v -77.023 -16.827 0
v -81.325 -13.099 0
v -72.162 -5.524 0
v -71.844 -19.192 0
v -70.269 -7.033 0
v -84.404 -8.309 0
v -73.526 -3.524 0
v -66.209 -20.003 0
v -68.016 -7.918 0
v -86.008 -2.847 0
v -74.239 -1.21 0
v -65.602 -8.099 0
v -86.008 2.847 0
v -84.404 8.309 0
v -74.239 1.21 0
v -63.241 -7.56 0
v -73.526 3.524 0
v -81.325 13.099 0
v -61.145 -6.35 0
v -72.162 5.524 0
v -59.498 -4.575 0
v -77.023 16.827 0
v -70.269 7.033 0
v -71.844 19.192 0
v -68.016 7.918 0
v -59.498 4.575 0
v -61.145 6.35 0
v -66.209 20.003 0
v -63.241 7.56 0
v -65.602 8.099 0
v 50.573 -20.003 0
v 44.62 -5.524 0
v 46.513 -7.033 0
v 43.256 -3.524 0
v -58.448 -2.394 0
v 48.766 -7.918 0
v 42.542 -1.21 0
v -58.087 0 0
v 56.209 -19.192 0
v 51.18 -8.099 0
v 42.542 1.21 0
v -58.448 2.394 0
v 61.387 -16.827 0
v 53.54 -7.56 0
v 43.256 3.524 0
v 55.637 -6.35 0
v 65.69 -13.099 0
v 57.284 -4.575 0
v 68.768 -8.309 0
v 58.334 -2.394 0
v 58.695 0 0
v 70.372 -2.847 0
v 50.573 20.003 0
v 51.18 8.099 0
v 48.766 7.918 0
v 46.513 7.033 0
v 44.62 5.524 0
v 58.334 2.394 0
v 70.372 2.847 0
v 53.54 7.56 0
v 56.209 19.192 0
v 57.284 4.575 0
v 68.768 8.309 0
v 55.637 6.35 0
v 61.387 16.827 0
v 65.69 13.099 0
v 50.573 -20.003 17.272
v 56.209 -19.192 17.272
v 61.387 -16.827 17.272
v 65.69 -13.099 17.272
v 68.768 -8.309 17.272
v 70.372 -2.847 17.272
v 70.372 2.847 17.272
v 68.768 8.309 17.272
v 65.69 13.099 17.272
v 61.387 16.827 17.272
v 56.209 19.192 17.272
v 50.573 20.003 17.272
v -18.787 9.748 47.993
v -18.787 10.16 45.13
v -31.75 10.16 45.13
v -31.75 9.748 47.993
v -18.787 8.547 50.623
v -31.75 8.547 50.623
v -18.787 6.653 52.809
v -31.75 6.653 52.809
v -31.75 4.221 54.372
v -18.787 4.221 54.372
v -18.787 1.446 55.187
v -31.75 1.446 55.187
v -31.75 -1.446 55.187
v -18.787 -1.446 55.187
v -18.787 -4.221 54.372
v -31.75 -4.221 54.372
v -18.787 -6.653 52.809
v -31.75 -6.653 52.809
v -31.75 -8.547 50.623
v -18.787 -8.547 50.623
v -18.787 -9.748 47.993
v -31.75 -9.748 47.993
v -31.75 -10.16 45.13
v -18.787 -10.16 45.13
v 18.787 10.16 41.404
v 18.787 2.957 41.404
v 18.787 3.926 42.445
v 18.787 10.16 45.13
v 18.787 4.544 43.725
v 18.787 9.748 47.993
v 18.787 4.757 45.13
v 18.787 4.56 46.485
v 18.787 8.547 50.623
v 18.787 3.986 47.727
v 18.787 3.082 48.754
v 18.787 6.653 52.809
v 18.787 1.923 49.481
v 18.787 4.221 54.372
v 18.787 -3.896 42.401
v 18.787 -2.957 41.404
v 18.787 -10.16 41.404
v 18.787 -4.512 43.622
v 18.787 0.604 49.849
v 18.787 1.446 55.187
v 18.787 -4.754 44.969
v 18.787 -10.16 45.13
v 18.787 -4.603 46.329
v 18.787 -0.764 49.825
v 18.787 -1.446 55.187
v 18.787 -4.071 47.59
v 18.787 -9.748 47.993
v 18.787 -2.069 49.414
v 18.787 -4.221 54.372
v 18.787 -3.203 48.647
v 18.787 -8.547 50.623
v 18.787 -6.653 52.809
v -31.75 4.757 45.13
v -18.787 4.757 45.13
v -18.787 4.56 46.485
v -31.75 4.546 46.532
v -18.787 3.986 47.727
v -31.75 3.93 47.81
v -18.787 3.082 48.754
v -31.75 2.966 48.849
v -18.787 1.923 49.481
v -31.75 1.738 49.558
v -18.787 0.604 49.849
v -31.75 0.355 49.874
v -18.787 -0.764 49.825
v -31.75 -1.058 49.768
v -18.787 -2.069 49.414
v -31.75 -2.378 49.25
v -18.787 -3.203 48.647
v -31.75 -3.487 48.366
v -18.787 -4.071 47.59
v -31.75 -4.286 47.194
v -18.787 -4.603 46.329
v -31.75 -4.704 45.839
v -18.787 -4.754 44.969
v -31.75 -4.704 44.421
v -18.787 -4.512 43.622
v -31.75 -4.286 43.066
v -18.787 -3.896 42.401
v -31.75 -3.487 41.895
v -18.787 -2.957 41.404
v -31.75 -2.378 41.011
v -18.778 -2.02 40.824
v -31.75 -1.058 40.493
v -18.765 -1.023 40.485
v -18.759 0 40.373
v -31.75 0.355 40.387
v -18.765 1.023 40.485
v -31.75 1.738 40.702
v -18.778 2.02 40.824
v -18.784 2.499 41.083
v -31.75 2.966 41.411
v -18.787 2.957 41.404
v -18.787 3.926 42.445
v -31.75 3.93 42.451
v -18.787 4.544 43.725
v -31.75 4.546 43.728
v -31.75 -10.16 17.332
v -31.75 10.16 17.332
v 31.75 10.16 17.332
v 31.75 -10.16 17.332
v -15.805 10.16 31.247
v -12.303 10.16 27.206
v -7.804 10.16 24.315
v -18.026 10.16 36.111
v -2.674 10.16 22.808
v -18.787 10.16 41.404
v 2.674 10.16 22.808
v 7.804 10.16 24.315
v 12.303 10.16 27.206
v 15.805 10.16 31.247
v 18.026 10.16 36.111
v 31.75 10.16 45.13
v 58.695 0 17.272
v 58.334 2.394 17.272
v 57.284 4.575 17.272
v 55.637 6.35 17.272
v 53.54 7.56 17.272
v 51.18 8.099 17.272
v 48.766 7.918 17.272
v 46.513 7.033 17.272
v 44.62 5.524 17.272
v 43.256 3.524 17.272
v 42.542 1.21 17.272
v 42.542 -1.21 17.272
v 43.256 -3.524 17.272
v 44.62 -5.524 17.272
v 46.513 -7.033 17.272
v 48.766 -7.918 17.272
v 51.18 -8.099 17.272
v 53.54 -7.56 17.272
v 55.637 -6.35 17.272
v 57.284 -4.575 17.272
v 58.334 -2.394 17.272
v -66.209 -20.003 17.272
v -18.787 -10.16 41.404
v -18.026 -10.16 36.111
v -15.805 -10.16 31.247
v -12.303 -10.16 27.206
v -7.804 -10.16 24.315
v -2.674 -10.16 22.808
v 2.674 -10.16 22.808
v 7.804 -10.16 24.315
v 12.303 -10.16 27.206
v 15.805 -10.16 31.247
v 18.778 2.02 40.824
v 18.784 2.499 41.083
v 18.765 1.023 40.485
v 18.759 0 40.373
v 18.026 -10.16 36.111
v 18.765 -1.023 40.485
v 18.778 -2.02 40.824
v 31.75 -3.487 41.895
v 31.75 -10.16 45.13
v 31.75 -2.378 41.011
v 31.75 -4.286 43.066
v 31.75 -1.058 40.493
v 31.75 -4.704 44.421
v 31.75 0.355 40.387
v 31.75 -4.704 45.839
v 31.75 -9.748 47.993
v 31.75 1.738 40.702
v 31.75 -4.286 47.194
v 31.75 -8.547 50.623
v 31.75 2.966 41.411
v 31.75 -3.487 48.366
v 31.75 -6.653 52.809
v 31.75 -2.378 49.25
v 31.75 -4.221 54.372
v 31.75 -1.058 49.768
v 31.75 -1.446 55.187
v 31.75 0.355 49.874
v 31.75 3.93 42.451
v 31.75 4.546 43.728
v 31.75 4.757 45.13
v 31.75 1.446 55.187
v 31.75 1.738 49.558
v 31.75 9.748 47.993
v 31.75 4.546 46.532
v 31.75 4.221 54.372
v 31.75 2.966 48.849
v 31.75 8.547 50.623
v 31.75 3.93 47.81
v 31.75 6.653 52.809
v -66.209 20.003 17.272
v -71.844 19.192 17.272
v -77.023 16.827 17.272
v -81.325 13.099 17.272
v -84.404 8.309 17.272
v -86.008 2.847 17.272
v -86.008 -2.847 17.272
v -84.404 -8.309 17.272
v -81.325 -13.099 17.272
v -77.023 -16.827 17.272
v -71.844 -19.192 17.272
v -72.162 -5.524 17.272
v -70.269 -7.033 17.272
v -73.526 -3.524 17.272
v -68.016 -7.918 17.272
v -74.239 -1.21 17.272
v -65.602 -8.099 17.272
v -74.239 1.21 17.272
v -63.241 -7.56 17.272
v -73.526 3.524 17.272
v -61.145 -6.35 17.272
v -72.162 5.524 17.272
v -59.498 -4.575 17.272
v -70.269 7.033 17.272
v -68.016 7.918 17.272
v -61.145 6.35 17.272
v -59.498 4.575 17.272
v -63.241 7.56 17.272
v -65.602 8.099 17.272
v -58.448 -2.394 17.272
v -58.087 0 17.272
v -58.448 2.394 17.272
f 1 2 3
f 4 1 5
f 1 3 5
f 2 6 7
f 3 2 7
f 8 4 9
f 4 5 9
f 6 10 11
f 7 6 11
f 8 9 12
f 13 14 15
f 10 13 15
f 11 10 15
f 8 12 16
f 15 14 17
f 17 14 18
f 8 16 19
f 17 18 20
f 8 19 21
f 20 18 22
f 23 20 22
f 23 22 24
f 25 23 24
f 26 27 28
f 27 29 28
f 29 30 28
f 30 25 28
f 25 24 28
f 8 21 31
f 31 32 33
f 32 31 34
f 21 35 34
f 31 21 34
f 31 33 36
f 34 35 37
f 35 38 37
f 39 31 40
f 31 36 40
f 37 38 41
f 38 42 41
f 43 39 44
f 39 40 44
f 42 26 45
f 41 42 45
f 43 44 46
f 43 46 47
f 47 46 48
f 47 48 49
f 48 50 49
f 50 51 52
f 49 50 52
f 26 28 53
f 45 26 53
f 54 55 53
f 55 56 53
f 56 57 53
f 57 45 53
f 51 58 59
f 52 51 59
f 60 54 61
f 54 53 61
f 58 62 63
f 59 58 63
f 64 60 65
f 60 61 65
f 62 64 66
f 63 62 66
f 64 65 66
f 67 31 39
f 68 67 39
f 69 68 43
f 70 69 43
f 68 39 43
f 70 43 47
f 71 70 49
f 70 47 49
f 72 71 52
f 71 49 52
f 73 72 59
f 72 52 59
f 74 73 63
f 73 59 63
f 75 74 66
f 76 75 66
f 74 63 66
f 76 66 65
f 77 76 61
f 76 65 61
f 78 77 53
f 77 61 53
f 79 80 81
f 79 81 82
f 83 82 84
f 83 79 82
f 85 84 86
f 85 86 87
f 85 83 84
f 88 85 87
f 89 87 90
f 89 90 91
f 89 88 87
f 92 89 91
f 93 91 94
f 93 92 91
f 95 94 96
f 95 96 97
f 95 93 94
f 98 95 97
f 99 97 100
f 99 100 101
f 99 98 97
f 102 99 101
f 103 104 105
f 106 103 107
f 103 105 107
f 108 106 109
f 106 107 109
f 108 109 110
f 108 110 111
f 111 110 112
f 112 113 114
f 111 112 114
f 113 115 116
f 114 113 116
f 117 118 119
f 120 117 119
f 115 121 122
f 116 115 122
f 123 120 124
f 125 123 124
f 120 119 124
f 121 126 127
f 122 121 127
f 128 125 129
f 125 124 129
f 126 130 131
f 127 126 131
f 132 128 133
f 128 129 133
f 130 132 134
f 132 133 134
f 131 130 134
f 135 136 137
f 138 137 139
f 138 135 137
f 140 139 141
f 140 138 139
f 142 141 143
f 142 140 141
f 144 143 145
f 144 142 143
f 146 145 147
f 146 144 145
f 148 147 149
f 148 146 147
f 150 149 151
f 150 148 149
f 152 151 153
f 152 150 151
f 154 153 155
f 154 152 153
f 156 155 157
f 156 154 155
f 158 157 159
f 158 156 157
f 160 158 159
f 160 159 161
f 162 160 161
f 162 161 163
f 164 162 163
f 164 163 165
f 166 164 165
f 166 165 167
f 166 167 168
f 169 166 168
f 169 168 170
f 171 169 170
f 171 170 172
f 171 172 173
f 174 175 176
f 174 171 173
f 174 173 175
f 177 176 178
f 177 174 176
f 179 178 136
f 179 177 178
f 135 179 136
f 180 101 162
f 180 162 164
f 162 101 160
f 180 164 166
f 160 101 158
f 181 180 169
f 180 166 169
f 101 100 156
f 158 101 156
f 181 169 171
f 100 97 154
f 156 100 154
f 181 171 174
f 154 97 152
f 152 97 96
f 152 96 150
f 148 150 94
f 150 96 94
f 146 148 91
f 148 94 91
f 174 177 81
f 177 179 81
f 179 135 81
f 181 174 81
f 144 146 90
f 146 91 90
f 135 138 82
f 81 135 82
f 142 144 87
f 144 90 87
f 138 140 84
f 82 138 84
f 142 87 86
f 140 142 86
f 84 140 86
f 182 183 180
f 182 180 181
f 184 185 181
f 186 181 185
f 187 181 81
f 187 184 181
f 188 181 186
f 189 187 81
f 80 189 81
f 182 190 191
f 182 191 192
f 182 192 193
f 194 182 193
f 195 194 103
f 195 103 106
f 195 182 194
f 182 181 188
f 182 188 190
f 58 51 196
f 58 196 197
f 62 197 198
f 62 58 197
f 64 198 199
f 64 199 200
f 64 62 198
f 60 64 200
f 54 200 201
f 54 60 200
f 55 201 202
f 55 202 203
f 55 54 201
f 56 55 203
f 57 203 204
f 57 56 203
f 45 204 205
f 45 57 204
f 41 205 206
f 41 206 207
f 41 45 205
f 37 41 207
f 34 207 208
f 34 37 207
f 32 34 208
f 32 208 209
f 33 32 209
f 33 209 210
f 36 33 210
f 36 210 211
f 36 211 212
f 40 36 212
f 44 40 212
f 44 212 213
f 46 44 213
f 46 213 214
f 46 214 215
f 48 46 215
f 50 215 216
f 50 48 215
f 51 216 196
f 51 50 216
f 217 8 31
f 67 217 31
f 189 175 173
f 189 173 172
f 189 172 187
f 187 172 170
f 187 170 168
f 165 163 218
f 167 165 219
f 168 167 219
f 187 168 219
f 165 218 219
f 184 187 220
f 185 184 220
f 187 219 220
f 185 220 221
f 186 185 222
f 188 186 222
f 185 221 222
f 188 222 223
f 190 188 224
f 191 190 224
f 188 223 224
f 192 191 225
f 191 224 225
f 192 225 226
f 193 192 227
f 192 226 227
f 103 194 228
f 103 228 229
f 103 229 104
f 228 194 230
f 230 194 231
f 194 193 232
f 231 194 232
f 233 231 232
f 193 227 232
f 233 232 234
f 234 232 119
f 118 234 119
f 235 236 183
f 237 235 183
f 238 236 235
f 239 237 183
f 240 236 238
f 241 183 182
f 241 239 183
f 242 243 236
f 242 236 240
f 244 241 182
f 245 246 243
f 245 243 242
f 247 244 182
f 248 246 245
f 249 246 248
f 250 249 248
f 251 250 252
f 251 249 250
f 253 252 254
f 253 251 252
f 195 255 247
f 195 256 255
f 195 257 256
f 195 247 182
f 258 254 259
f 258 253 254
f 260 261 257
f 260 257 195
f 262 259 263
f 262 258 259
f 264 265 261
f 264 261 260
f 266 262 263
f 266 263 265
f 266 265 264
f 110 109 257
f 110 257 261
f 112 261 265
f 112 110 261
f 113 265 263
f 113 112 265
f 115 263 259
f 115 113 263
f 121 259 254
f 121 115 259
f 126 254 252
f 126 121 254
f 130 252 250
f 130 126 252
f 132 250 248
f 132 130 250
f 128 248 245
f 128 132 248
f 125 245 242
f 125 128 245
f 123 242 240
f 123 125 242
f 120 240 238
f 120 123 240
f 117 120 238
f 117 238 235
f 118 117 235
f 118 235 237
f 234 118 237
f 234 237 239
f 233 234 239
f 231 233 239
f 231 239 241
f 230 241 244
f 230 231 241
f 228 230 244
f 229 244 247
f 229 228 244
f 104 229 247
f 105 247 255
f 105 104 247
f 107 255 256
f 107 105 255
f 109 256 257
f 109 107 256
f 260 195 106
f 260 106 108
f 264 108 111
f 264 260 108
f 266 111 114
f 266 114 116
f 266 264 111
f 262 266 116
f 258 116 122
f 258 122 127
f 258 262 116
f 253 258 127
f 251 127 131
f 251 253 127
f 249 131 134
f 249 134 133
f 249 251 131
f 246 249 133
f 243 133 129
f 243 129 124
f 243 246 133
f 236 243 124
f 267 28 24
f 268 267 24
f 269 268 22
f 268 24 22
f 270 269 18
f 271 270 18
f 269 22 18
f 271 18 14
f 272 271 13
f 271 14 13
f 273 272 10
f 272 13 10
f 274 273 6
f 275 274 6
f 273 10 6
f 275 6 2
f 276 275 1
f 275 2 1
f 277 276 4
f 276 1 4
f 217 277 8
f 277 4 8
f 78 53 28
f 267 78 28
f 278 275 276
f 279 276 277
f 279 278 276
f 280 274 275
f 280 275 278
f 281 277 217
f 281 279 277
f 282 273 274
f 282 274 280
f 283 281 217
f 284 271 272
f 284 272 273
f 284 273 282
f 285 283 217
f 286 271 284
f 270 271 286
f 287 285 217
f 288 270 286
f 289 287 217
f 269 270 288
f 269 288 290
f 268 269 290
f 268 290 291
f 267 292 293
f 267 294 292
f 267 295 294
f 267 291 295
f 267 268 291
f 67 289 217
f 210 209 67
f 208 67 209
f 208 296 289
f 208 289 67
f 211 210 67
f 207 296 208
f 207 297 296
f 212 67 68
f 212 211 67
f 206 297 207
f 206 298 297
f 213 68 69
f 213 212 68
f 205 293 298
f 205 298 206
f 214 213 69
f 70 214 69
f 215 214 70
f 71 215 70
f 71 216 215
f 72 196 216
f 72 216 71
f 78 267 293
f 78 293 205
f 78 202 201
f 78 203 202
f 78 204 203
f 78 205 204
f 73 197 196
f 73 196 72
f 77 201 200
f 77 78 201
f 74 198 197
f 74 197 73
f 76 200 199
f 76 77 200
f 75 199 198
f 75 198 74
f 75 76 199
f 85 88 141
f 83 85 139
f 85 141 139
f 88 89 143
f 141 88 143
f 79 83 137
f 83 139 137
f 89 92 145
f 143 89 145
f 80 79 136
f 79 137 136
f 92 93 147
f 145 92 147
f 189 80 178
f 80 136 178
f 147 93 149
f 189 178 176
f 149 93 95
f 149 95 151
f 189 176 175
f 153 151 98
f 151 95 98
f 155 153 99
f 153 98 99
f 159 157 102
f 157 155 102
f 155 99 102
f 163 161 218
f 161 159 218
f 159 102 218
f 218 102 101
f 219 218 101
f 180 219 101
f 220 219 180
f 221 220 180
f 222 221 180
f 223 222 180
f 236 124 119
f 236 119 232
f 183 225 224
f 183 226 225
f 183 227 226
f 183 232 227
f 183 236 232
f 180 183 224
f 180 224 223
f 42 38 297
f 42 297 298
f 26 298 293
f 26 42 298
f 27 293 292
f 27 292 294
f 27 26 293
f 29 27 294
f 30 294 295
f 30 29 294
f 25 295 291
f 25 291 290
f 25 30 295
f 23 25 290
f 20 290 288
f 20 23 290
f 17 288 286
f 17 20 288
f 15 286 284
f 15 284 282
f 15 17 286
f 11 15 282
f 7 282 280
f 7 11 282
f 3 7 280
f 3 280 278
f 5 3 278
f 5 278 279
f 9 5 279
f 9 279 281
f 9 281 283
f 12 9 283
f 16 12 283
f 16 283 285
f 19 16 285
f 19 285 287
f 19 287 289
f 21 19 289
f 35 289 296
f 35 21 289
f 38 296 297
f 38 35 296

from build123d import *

# Parameters (mm, degrees)
F0_R     = 8.121516
F1_DEPTH = 17.272
F2_R     = 4.756844
F3_DEPTH = 31.75
F5_DEPTH = 12.7


with BuildPart() as f1:
    # F0 (on Top) → F1 (new body)
    with BuildSketch(Plane.XY):
        with BuildLine():
            Line((50.573271, 20.002603), (-66.208519, 20.002603))
            ThreePointArc((-66.208519, 20.002603), (-86.211122, 0), (-66.208519, -20.002603))
            Line((-66.208519, -20.002603), (50.573271, -20.002603))
            ThreePointArc((50.573271, -20.002603), (70.575874, 0), (50.573271, 20.002603))
        make_face()
        with Locations((-66.208519, 0)):
            Circle(F0_R, mode=Mode.SUBTRACT)
        with Locations((50.573271, 0)):
            Circle(F0_R, mode=Mode.SUBTRACT)
    extrude(amount=F1_DEPTH)


with BuildPart() as f3:
    # F2 (on Right) → F3 (new body, symmetric)
    with BuildSketch(Plane.YZ):
        with BuildLine():
            Line((-10.16, 45.130305), (-10.16, 17.331807))
            Line((-10.16, 17.331807), (10.16, 17.331807))
            Line((10.16, 17.331807), (10.16, 45.130305))
            ThreePointArc((10.16, 45.130305), (0, 55.290305), (-10.16, 45.130305))
        make_face()
        with Locations((0, 45.130305)):
            Circle(F2_R, mode=Mode.SUBTRACT)
    extrude(amount=F3_DEPTH, both=True)

    # F4 (on Front) → F5 (cut, symmetric)
    with BuildSketch(Plane.XZ):
        with BuildLine():
            Line((-18.787204, 67.077145), (-18.787204, 41.404452))
            ThreePointArc((-18.787204, 41.404452), (0, 22.617248), (18.787204, 41.404452))
            Line((18.787204, 41.404452), (18.787204, 67.270167))
            Line((18.787204, 67.270167), (-18.787204, 67.077145))
        make_face()
    extrude(amount=F5_DEPTH, both=True, mode=Mode.SUBTRACT)


solid = Compound([f1.part, f3.part])
